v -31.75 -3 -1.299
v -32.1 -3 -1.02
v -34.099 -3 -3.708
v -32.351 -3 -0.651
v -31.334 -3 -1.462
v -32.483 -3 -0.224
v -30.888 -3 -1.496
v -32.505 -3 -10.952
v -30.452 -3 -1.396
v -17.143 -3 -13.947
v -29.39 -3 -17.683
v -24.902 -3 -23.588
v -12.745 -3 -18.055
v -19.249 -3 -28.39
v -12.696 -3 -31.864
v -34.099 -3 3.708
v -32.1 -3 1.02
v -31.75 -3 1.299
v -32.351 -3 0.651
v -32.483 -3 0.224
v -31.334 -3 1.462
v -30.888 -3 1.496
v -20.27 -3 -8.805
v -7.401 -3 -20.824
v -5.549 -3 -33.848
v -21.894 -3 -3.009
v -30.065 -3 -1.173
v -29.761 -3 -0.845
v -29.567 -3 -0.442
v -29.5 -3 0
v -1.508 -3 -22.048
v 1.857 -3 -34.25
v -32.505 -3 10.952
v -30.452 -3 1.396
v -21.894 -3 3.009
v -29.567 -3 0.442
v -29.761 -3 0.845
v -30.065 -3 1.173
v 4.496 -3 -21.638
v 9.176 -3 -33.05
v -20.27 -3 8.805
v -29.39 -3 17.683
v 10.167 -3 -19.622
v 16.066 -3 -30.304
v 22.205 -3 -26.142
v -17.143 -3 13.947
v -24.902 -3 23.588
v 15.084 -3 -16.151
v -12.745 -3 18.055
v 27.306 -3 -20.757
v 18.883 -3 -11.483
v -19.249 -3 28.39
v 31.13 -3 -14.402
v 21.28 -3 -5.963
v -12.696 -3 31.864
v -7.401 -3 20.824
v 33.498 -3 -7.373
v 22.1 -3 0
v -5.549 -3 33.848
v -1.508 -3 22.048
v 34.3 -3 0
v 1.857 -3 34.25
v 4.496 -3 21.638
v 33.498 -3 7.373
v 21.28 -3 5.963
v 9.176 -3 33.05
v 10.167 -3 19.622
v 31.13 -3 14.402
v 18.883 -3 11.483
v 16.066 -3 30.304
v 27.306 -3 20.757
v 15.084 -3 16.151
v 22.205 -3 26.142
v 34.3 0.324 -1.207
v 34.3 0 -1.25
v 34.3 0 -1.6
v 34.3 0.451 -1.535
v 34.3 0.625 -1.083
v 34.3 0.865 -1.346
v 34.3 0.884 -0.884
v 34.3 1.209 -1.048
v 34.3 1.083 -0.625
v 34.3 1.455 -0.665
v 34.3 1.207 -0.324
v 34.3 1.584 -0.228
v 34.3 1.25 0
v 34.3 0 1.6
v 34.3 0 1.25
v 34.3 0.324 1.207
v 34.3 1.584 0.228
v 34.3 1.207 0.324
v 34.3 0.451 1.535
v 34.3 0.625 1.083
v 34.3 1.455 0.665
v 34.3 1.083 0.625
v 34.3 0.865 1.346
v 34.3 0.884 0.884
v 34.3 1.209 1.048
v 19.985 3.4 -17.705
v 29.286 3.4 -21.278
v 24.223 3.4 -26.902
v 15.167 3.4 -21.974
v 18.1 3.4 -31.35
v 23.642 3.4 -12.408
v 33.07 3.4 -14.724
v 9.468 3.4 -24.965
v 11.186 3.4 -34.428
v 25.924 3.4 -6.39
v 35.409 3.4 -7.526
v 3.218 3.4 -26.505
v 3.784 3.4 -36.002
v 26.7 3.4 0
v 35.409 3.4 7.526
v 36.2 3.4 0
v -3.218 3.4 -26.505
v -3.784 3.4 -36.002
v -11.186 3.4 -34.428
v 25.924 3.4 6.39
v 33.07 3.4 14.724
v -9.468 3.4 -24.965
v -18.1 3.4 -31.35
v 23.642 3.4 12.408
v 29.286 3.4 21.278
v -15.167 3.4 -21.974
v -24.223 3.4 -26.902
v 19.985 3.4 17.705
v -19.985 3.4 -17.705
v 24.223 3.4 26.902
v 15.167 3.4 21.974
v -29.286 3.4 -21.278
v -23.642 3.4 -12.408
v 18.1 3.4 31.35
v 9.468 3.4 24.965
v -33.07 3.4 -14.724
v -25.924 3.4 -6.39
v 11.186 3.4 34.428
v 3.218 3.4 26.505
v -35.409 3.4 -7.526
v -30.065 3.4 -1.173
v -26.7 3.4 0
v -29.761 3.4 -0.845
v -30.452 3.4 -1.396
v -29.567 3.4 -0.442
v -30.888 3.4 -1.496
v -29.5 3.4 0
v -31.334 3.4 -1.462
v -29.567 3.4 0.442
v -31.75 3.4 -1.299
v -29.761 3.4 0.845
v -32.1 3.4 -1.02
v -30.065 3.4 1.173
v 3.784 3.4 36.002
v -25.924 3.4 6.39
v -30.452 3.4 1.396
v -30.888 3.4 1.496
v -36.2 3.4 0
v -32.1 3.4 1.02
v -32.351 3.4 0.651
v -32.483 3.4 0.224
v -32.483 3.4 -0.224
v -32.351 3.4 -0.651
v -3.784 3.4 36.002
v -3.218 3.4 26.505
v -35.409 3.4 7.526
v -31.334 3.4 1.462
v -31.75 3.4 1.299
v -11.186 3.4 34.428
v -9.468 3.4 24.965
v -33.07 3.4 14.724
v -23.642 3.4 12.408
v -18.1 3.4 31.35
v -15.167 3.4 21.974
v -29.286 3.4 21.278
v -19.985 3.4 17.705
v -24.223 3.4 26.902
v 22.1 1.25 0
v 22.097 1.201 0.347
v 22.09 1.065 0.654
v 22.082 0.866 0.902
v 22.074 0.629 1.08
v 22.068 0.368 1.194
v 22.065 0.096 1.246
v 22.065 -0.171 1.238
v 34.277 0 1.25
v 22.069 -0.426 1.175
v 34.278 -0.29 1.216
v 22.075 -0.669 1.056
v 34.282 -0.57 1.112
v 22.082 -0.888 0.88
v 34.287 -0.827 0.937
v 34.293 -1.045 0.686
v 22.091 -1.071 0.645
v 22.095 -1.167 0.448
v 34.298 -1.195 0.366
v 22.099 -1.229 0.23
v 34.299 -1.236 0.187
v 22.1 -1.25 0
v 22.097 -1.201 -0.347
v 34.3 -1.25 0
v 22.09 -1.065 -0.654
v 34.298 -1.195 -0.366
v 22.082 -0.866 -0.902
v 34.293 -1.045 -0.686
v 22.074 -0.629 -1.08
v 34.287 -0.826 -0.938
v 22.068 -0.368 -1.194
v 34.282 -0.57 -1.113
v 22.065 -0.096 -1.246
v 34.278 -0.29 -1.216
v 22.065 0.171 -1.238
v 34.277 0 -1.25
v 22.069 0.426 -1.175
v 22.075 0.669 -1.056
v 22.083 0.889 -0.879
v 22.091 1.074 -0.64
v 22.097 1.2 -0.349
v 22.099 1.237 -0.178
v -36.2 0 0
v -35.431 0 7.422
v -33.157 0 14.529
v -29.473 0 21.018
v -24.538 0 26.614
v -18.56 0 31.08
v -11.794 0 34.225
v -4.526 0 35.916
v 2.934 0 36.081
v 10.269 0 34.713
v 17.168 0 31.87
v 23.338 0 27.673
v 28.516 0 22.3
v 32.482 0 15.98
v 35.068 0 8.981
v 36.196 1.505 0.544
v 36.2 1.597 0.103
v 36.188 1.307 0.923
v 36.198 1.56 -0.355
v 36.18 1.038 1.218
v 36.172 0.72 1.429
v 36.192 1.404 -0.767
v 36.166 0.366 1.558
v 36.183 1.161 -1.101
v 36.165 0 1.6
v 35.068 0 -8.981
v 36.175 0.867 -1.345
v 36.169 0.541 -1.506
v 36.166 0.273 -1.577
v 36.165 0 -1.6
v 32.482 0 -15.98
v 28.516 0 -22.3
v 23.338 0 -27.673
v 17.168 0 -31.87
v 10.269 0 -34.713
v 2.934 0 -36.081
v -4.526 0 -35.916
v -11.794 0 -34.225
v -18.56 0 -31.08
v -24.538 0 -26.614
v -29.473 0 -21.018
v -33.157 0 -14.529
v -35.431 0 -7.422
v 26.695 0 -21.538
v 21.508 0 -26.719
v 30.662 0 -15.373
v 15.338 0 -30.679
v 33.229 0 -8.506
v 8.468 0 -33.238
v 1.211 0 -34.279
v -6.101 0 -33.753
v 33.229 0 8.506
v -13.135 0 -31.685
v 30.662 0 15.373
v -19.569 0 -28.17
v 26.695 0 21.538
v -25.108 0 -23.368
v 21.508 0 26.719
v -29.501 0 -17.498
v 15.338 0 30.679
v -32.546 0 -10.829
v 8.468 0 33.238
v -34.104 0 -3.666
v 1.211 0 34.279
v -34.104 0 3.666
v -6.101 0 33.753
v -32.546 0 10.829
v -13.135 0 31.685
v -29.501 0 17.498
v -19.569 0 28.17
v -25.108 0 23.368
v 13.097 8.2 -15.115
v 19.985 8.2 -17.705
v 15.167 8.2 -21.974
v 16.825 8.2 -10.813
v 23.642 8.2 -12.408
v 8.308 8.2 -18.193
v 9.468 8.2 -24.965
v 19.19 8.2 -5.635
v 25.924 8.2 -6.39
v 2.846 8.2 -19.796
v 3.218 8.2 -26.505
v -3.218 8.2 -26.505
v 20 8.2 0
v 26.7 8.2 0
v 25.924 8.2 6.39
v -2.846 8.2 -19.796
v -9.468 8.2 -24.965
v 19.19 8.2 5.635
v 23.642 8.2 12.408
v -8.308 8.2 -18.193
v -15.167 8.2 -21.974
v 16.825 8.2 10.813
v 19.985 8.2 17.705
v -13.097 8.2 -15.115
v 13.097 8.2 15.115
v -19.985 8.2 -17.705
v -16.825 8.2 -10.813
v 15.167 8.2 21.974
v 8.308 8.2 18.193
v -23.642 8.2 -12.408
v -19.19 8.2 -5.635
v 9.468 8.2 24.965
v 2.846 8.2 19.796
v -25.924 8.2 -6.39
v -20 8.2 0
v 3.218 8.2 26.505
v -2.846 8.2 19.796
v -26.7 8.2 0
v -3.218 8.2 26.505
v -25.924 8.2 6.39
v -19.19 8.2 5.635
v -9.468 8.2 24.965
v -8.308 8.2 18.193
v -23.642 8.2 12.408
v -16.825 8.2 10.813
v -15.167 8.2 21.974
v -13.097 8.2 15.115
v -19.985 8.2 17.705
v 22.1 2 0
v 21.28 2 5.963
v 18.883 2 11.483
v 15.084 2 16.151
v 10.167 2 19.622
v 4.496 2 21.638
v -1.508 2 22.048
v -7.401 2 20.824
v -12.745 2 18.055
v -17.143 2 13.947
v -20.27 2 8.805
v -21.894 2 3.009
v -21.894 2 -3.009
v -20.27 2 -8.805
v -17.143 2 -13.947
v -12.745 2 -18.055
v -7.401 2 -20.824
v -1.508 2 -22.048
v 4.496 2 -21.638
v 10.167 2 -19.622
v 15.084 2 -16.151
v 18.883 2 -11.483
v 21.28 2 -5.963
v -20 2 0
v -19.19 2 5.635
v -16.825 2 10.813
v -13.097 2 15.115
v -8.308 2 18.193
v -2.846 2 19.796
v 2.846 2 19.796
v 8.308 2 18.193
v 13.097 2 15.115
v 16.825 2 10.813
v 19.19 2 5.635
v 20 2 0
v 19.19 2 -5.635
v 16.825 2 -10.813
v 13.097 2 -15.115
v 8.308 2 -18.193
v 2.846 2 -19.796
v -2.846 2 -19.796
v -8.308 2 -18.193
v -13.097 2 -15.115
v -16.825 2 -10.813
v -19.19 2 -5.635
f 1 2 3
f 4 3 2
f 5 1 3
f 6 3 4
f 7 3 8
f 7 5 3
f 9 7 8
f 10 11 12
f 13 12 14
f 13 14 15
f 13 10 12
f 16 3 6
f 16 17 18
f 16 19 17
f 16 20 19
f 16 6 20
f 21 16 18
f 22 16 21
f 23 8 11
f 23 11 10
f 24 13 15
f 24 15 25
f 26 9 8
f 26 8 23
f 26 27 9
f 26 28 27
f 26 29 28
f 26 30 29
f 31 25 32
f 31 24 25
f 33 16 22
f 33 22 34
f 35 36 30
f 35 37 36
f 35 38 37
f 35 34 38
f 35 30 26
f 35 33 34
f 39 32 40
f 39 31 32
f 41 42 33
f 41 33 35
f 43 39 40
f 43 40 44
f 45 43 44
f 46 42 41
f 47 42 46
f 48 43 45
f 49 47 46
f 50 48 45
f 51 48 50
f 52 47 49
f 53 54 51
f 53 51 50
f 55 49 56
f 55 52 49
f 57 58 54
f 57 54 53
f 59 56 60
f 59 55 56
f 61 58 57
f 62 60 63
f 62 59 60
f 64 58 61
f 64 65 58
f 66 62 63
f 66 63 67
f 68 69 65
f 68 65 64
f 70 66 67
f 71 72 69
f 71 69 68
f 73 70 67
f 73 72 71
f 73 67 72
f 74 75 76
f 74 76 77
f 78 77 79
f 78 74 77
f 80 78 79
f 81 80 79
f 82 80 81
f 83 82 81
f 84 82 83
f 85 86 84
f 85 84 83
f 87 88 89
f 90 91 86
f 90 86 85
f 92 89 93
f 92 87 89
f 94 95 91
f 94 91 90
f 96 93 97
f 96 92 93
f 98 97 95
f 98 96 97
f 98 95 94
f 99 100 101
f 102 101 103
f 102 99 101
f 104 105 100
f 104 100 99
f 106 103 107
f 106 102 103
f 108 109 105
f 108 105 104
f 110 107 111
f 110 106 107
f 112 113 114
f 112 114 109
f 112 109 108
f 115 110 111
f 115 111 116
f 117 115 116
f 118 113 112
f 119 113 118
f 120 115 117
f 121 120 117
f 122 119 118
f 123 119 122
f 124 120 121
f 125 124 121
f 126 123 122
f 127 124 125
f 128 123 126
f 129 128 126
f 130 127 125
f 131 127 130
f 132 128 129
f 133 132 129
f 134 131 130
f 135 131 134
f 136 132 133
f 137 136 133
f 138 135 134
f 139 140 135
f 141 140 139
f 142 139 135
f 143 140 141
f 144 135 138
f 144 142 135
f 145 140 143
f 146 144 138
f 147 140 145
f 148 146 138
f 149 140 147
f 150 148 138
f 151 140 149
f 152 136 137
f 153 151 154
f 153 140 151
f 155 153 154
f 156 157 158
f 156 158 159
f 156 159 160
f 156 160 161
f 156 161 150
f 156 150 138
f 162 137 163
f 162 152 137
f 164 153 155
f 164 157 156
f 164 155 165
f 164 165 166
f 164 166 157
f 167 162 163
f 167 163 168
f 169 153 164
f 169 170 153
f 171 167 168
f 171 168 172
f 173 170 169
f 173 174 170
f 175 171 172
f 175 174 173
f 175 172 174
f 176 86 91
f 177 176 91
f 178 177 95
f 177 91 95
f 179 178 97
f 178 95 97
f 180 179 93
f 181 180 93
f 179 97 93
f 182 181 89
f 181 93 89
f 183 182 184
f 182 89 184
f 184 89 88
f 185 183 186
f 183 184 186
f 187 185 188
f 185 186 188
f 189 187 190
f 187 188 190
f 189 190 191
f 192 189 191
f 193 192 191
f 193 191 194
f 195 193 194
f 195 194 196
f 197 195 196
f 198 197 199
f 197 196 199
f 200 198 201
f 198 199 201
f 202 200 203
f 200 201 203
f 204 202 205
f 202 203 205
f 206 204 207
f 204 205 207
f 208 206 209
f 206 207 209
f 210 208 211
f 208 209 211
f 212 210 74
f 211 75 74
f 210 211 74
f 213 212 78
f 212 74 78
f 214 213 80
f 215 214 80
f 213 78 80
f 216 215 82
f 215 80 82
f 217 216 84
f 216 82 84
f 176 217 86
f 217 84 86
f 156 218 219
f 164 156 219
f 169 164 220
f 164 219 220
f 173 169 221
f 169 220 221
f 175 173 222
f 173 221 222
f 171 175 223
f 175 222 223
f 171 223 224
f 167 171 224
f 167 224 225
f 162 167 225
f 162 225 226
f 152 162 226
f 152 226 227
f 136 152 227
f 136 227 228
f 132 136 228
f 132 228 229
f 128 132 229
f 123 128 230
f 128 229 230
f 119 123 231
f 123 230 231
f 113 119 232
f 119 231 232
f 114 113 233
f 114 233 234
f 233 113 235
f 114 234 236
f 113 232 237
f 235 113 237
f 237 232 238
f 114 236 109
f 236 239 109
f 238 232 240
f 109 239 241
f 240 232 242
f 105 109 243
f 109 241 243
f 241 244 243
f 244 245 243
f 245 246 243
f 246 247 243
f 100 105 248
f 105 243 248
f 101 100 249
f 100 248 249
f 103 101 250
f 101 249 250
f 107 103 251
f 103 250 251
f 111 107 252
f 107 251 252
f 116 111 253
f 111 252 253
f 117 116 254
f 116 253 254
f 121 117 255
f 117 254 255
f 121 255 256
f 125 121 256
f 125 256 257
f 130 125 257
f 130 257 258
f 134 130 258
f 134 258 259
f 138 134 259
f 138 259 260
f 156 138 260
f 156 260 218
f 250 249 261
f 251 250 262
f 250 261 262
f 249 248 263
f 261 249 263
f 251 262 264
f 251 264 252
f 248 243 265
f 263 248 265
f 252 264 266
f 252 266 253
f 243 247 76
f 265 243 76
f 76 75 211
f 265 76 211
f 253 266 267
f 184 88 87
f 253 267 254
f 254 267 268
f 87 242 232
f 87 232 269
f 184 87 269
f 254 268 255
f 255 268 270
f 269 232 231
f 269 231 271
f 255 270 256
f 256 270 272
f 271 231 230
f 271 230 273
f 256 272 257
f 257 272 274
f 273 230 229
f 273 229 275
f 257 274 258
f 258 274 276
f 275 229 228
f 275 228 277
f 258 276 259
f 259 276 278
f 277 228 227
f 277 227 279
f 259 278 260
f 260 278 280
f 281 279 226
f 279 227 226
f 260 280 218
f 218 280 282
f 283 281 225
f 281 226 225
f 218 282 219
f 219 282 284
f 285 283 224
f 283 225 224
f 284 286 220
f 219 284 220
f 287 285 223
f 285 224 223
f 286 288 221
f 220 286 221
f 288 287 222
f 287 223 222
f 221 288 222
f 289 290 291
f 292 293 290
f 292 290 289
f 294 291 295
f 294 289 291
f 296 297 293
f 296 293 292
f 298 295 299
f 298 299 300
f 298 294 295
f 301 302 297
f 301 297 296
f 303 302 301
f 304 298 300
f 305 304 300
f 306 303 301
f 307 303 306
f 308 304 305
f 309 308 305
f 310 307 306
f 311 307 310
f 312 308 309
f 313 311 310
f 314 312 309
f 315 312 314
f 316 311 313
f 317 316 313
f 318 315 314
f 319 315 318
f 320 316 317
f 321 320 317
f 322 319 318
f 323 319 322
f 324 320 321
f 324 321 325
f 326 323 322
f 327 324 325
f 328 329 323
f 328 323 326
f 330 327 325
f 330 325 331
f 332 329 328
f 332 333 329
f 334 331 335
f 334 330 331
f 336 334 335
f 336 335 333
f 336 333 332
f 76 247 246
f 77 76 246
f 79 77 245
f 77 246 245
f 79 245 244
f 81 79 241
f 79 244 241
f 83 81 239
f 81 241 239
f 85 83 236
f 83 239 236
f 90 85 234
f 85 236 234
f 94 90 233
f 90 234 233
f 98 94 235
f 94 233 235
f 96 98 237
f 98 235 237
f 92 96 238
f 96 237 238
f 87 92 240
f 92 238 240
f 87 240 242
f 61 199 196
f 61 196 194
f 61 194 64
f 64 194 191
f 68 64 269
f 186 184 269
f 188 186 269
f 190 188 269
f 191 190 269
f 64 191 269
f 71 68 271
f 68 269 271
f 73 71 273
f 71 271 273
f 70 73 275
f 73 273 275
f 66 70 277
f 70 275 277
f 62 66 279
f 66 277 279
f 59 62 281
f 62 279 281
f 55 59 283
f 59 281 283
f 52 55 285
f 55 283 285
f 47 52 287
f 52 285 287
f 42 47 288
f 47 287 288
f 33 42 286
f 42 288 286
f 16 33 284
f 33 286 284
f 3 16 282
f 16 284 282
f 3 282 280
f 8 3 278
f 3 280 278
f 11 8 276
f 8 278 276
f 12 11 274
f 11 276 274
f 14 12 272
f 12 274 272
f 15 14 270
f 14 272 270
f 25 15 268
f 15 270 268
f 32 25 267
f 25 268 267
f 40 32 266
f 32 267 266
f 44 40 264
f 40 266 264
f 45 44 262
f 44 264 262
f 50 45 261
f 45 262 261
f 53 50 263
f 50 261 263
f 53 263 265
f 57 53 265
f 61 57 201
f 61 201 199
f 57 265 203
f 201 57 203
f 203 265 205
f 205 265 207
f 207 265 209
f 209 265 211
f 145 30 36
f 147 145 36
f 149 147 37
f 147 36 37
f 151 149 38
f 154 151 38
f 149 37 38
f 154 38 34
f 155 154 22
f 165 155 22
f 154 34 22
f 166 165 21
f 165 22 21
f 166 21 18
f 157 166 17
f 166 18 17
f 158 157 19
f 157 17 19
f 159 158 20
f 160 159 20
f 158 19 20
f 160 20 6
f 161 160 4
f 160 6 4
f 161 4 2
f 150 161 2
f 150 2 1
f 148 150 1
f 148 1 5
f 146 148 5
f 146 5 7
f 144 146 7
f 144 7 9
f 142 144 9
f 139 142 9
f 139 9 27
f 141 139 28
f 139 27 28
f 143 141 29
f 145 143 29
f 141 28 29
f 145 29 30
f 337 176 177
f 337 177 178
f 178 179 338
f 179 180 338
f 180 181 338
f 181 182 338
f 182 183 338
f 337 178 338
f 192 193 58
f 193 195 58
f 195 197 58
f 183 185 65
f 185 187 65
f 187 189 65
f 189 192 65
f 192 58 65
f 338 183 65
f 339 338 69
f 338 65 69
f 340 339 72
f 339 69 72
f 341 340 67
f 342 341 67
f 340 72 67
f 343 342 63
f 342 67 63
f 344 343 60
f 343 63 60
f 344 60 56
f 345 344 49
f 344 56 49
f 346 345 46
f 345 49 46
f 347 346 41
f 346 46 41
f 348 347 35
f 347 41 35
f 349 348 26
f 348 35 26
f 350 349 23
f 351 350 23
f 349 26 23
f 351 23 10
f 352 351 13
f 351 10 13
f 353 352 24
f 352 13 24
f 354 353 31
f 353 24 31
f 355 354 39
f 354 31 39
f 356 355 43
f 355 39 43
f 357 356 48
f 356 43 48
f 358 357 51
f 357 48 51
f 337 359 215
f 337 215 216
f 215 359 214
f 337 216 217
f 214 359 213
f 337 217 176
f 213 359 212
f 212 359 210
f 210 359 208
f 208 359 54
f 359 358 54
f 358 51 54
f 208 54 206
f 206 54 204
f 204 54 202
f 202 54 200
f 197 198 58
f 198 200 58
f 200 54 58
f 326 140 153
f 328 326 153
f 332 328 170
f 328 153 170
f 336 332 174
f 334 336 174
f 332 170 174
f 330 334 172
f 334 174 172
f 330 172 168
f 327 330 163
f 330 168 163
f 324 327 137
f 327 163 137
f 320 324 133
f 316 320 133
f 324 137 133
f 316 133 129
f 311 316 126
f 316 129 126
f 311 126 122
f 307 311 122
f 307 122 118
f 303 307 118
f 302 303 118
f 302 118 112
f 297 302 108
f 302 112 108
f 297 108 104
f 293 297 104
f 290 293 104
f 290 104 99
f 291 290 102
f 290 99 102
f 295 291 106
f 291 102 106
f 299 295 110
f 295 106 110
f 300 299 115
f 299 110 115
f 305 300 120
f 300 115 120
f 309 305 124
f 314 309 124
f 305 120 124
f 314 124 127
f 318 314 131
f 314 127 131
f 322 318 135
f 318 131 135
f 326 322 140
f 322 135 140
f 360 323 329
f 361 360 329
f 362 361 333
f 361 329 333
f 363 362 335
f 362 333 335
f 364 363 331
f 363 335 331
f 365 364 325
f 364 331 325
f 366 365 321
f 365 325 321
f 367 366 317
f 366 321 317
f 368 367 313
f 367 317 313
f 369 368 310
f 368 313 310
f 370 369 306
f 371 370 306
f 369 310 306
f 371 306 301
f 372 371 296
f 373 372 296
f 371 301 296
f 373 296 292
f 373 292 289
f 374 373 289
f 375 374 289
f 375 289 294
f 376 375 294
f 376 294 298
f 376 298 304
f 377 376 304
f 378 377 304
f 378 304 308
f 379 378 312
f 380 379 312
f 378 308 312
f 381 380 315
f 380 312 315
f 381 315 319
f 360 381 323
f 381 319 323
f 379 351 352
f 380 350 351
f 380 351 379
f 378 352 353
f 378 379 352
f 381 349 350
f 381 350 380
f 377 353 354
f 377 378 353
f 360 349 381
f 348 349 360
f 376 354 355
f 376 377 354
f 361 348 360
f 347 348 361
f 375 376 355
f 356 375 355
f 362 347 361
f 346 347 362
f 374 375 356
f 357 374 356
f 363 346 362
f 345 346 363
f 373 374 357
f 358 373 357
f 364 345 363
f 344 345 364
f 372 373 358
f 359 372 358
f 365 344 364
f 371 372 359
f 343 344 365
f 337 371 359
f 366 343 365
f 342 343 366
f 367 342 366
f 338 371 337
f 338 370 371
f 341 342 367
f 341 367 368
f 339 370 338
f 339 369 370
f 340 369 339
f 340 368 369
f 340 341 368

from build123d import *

# Parameters (mm, degrees)
F0_R      = 34.3
F1_DEPTH  = 3
F2_R      = 36.2
F3_DEPTH  = 3.4
F4_R      = 26.7
F5_DEPTH  = 4.8
F6_R      = 20
F7_DEPTH  = 6.2
F8_R      = 22.1
F9_DEPTH  = 5
F10_R     = 1.5
F11_DEPTH = 6.4
F13_R     = 1.6
F14_DEPTH = 1.9
F15_R     = 1.25
F16_DEPTH = 15


with BuildPart() as f1:
    # F0 (on Front) → F1 (new body)
    with BuildSketch(Plane.XZ):
        Circle(F0_R)
    extrude(amount=F1_DEPTH)

    # F2 (on face) → F3 (join)
    with BuildSketch(Plane(origin=(0, 0, 0), x_dir=(-1, 0, 0), z_dir=(0, 1, 0))):
        Circle(F2_R)
    extrude(amount=F3_DEPTH)

    # F4 (on face) → F5 (join)
    with BuildSketch(Plane(origin=(0, 3.4, 0), x_dir=(-1, 0, 0), z_dir=(0, 1, 0))):
        Circle(F4_R)
    extrude(amount=F5_DEPTH)

    # F6 (on face) → F7 (cut)
    with BuildSketch(Plane(origin=(0, 8.2, 0), x_dir=(-1, 0, 0), z_dir=(0, 1, 0))):
        Circle(F6_R)
    extrude(amount=-F7_DEPTH, mode=Mode.SUBTRACT)

    # F8 (on face) → F9 (cut)
    with BuildSketch(Plane.XZ.offset(3)):
        Circle(F8_R)
    extrude(amount=-F9_DEPTH, mode=Mode.SUBTRACT)

    # F10 (on face) → F11 (cut)
    with BuildSketch(Plane.XZ.offset(3)):
        with Locations((-31, 0)):
            Circle(F10_R)
    extrude(amount=-F11_DEPTH, mode=Mode.SUBTRACT)

    # F13 (on offset) → F14 (cut)
    with BuildSketch(Plane.YZ.offset(36.2)):
        Circle(F13_R)
    extrude(amount=-F14_DEPTH, mode=Mode.SUBTRACT)

    # F15 (on offset) → F16 (cut)
    with BuildSketch(Plane.YZ.offset(36.2)):
        Circle(F15_R)
    extrude(amount=-F16_DEPTH, mode=Mode.SUBTRACT)


solid = f1.part
